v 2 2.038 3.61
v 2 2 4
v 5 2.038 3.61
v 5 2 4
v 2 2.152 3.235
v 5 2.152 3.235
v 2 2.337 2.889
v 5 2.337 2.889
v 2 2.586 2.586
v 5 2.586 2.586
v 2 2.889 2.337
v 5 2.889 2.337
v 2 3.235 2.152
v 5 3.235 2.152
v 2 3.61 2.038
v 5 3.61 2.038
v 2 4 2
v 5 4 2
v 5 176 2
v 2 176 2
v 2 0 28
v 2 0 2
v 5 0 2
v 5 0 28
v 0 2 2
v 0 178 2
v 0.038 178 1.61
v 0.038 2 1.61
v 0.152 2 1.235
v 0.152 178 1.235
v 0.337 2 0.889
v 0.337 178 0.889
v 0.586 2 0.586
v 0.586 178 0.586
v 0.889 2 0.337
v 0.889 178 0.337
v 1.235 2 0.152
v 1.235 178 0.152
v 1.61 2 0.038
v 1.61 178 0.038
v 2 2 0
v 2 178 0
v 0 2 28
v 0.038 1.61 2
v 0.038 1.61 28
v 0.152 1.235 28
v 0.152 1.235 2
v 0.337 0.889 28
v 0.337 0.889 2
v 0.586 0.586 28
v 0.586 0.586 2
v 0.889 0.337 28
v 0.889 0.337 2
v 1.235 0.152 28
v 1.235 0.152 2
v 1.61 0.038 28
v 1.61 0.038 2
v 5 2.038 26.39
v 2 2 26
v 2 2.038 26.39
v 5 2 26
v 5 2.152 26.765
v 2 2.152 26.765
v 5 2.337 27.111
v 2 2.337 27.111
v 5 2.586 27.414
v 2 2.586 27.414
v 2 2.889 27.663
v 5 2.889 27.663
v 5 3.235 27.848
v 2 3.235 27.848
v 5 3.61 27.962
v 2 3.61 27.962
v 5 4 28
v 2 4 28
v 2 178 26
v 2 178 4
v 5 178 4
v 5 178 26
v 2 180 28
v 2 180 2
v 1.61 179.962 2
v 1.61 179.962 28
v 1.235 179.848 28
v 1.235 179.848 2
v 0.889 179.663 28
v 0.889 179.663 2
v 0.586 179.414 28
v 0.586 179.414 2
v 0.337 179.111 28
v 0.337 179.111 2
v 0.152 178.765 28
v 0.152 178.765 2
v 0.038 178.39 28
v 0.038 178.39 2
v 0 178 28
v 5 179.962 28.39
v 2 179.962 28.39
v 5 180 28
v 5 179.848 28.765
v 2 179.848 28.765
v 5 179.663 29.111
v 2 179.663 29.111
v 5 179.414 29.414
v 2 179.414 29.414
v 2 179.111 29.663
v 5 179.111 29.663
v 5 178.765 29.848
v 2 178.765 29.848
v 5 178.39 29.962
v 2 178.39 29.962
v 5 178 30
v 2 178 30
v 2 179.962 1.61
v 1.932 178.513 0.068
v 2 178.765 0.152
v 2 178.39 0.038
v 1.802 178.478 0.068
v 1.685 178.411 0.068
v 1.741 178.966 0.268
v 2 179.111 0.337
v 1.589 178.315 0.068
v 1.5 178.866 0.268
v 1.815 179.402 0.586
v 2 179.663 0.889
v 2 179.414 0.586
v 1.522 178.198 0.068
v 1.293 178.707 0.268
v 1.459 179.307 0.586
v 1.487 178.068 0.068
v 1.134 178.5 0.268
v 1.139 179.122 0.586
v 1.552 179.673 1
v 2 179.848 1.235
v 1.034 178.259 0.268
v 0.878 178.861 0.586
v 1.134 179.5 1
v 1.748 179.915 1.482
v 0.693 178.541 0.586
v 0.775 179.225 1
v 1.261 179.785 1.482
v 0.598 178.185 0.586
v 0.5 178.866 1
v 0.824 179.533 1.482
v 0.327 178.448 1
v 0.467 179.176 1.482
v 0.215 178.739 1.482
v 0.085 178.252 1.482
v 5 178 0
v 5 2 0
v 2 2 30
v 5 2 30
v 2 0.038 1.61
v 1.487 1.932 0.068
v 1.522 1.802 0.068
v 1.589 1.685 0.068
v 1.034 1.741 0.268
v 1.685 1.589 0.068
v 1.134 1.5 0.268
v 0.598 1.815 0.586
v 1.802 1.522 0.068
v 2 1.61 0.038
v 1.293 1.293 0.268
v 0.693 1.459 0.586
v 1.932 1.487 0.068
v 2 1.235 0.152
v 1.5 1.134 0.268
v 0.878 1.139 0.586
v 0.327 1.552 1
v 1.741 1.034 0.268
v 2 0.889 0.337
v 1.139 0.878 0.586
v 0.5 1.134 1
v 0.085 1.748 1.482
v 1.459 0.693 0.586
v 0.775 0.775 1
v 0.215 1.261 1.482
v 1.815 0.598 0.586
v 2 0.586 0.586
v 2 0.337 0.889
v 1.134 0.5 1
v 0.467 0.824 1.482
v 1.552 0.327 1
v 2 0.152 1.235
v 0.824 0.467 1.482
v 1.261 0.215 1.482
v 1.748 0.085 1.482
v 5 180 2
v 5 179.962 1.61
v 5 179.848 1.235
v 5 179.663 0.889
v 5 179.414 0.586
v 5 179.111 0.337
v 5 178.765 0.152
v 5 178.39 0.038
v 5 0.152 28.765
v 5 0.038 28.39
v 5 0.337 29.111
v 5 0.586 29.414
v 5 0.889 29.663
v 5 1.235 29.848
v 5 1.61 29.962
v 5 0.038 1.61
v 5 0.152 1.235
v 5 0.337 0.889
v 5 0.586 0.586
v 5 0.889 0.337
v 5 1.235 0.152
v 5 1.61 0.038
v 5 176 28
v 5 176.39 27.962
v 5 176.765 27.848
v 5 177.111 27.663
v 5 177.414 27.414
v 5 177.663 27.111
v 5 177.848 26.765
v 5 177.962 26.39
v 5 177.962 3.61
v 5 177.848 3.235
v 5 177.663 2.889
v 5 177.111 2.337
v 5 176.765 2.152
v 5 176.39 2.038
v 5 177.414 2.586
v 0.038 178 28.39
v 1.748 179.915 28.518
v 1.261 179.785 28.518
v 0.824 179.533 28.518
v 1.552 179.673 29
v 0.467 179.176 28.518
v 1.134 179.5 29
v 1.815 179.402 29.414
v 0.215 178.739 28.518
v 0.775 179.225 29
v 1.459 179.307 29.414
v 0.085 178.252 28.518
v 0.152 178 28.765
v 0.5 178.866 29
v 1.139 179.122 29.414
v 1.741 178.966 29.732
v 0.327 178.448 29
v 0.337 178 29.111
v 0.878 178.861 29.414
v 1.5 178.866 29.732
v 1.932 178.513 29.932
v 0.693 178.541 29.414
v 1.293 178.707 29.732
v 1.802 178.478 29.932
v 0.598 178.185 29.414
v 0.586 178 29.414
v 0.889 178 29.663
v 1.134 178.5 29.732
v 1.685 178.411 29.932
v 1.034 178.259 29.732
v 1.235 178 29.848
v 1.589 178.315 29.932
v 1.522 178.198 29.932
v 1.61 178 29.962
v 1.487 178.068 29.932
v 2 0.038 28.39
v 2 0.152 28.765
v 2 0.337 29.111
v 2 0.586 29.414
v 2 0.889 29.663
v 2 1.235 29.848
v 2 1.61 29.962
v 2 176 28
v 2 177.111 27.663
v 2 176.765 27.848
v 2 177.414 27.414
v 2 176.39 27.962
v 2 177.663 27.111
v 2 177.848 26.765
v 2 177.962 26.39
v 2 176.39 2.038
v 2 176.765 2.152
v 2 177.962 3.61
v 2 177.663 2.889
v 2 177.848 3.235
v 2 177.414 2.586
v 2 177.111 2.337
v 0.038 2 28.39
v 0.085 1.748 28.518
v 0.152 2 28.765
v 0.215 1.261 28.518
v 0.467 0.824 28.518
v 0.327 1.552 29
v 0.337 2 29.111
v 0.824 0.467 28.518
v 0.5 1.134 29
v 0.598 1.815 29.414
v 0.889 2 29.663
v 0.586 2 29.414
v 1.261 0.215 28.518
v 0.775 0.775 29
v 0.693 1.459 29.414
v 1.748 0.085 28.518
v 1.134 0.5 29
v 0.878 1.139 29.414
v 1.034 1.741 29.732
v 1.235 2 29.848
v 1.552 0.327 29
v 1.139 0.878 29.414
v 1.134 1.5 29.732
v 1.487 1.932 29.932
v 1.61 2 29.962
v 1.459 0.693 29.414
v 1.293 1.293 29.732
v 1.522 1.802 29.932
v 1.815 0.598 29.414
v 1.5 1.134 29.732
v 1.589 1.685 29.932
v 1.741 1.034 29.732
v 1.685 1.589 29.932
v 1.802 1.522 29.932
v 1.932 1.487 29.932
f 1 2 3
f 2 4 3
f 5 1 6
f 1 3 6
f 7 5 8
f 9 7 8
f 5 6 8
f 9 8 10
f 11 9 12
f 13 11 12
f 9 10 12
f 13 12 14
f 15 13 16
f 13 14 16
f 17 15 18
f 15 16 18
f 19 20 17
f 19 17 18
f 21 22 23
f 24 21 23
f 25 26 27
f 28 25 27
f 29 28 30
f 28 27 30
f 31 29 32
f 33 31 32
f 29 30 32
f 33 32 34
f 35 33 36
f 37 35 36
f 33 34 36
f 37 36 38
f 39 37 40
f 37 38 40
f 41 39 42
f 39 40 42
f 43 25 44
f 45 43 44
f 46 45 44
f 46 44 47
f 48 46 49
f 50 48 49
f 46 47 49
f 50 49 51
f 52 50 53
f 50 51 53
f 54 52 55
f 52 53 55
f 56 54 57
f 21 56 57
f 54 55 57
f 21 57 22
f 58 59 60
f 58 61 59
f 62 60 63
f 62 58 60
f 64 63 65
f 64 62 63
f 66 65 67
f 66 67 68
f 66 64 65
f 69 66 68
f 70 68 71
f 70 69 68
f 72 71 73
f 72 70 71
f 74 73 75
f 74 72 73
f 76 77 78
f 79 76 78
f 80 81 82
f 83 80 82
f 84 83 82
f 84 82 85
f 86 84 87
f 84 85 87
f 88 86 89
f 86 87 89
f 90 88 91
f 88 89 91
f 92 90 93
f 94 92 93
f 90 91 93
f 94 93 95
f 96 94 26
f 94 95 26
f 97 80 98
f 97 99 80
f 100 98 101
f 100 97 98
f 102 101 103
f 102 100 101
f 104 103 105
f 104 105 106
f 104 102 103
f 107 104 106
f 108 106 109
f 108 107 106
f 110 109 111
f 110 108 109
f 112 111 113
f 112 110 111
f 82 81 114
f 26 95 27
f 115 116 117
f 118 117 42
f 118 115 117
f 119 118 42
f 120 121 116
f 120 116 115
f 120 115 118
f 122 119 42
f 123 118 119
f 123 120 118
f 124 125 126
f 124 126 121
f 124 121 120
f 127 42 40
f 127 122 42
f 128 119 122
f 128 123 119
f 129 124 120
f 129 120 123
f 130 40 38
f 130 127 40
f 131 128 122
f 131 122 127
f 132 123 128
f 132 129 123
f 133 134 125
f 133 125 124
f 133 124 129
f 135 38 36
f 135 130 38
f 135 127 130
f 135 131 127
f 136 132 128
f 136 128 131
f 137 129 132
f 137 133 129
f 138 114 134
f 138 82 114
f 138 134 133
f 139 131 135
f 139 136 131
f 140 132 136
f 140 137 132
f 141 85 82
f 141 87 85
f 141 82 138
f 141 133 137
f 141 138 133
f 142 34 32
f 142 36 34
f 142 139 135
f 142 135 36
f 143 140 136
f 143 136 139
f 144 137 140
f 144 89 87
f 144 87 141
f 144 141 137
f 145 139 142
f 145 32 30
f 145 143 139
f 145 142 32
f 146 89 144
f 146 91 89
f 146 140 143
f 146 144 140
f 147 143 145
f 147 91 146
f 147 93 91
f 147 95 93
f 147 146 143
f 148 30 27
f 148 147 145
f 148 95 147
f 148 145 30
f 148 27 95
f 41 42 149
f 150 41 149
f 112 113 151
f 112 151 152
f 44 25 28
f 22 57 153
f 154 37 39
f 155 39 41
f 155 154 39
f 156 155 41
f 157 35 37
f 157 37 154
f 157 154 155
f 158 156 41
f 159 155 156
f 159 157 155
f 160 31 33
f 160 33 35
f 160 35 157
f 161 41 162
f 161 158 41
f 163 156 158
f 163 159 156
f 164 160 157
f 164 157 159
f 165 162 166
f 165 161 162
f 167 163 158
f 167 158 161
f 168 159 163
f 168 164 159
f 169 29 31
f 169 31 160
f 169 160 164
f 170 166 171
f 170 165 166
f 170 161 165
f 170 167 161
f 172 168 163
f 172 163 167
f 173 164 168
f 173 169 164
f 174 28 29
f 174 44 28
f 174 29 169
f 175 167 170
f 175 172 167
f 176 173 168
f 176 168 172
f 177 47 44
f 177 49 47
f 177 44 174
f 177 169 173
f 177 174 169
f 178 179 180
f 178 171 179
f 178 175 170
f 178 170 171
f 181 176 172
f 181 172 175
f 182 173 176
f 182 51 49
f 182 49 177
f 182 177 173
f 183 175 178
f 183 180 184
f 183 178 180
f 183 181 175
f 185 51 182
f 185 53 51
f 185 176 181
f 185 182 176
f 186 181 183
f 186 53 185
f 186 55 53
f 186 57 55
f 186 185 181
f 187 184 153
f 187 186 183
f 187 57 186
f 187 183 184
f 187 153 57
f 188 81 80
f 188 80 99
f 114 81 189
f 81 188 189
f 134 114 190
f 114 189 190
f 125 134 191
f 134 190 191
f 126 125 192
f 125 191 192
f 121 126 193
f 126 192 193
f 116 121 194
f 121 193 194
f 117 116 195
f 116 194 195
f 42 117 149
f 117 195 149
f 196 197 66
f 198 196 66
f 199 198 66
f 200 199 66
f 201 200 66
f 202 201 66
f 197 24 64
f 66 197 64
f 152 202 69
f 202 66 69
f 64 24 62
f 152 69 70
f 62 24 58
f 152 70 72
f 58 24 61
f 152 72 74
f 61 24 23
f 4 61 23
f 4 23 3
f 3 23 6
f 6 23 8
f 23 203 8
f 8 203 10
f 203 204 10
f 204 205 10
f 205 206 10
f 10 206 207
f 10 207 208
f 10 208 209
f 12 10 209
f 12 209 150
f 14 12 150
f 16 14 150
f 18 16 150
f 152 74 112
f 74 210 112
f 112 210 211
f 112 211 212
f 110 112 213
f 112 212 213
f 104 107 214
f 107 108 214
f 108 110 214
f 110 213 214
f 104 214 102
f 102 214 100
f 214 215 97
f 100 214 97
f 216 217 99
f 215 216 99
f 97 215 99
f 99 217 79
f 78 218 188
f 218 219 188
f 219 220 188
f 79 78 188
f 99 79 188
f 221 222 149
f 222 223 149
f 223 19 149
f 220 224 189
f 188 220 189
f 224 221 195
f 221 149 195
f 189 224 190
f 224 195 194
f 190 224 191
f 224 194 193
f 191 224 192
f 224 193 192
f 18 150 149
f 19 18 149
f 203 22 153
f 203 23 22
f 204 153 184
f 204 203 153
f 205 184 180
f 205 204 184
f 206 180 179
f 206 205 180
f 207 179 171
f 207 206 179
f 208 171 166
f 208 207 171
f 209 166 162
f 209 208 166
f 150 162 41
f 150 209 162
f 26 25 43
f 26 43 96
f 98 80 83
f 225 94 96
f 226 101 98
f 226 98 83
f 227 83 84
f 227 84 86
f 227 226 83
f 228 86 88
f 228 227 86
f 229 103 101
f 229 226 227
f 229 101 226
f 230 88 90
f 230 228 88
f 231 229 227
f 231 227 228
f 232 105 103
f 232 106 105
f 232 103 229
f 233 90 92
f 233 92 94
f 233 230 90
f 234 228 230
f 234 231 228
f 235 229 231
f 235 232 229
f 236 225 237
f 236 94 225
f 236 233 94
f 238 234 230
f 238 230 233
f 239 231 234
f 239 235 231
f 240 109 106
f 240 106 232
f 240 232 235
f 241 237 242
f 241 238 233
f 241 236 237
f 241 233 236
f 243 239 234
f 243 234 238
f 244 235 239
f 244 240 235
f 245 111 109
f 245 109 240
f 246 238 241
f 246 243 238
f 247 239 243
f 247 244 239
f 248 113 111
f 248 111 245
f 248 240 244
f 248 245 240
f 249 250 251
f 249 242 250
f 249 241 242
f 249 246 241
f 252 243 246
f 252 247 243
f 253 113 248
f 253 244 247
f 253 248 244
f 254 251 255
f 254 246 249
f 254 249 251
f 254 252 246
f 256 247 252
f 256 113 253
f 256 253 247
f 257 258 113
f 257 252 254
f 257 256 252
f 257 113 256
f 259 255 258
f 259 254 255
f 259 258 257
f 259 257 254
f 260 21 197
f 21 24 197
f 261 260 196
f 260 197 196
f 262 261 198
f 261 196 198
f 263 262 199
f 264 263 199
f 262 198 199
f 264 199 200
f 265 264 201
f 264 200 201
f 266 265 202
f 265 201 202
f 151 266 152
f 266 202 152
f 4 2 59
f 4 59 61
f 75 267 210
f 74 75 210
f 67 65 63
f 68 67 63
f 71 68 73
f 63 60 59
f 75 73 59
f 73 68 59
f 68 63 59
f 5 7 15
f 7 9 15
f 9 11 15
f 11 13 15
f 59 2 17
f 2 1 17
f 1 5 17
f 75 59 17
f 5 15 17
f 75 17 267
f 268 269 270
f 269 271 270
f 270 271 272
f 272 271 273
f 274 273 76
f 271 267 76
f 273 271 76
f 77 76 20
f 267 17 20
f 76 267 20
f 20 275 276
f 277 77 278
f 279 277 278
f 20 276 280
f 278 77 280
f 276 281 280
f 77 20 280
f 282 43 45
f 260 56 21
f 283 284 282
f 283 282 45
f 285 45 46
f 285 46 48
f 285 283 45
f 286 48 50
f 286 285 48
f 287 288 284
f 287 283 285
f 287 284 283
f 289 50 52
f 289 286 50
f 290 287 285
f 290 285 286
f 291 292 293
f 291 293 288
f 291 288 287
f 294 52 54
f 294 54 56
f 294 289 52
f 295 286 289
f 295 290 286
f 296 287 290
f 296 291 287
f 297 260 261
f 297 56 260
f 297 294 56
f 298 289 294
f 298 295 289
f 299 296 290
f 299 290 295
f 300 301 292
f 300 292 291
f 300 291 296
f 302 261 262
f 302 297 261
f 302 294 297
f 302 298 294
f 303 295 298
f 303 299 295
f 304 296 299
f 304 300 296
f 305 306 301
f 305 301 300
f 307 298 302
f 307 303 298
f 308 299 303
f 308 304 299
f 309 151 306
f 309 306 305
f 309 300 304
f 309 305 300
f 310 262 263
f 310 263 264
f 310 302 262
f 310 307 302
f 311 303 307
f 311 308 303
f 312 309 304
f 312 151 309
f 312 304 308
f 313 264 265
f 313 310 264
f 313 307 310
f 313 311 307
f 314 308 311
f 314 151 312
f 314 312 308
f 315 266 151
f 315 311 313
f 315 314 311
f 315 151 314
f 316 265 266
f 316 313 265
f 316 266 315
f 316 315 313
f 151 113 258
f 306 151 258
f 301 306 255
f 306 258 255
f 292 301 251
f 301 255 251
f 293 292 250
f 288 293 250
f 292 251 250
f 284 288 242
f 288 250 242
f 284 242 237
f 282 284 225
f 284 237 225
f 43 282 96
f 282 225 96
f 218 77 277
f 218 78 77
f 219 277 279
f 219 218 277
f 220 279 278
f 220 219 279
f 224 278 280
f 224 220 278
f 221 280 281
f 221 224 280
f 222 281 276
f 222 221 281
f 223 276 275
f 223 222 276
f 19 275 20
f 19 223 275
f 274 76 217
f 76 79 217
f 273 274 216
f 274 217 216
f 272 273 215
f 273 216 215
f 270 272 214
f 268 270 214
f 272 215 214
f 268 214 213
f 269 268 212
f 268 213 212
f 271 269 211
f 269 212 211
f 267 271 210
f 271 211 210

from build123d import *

# Parameters (mm, degrees)
BOX007_W          = 3
BOX007_H          = 176
BOX007_DEPTH      = 26
FILLET003_R       = 2
BOX005_W          = 2
BOX005_H          = 176
BOX005_DEPTH      = 26
CYLINDER021_R     = 2
CYLINDER021_DEPTH = 26
CYLINDER022_R     = 2
CYLINDER022_DEPTH = 26
CYLINDER023_R     = 2
CYLINDER023_DEPTH = 176
CYLINDER024_R     = 2
CYLINDER024_DEPTH = 176
BOX006_W          = 3
BOX006_H          = 180
BOX006_DEPTH      = 30
FILLET002_R       = 2


with BuildPart() as fillet003:
    # Box007 → Box007 (new body)
    with BuildSketch(Plane(origin=(7, 2, 2), x_dir=(1, 0, 0), z_dir=(0, 0, 1))):
        with Locations((1.5, 88)):
            Rectangle(BOX007_W, BOX007_H)
    extrude(amount=BOX007_DEPTH)

    # Fillet003
    fillet003_edges = [fillet003.edges().sort_by_distance(p)[0] for p in [
        (8.5, 2, 2),
        (8.5, 2, 28),
        (8.5, 178, 2),
        (8.5, 178, 28),
    ]]
    fillet(fillet003_edges, radius=FILLET003_R)


with BuildPart() as fillet003_1:
    # Fillet003 placement: moved
    add(fillet003.part.moved(Location((-5, 0, 0))))


with BuildPart() as cube005:
    # Box005 → Box005 (new body)
    with BuildSketch(Plane(origin=(0, 2, 2), x_dir=(1, 0, 0), z_dir=(0, 0, 1))):
        with Locations((1, 88)):
            Rectangle(BOX005_W, BOX005_H)
    extrude(amount=BOX005_DEPTH)


with BuildPart() as cylinder021:
    # Cylinder021 → Cylinder021 (new body)
    with BuildSketch(Plane(origin=(2, 2, 2), x_dir=(0, 1, 0), z_dir=(0, 0, 1))):
        Circle(CYLINDER021_R)
    extrude(amount=CYLINDER021_DEPTH)


with BuildPart() as cylinder022:
    # Cylinder022 → Cylinder022 (new body)
    with BuildSketch(Plane(origin=(2, 178, 2), x_dir=(0, 1, 0), z_dir=(0, 0, 1))):
        Circle(CYLINDER022_R)
    extrude(amount=CYLINDER022_DEPTH)


with BuildPart() as cylinder023:
    # Cylinder023 → Cylinder023 (new body)
    with BuildSketch(Plane(origin=(2, 178, 2), x_dir=(1, 0, 0), z_dir=(0, -1, 0))):
        Circle(CYLINDER023_R)
    extrude(amount=CYLINDER023_DEPTH)


with BuildPart() as cylinder024:
    # Cylinder024 → Cylinder024 (new body)
    with BuildSketch(Plane(origin=(2, 178, 28), x_dir=(1, 0, 0), z_dir=(0, -1, 0))):
        Circle(CYLINDER024_R)
    extrude(amount=CYLINDER024_DEPTH)


with BuildPart() as sphere005:
    # Sphere004 → Sphere004 (revolve)
    with BuildSketch(Plane(origin=(2, 2, 2), x_dir=(1, 0, 0), z_dir=(0, -1, 0))):
        with BuildLine():
            ThreePointArc((0, -2), (2, 0), (0, 2))
            Line((0, 2), (0, -2))
        make_face()
    revolve(axis=Axis((2, 2, 2), (0, 0, 1)))


with BuildPart() as sphere006:
    # Sphere005 → Sphere005 (revolve)
    with BuildSketch(Plane(origin=(2, 178, 2), x_dir=(1, 0, 0), z_dir=(0, -1, 0))):
        with BuildLine():
            ThreePointArc((0, -2), (2, 0), (0, 2))
            Line((0, 2), (0, -2))
        make_face()
    revolve(axis=Axis((2, 178, 2), (0, 0, 1)))


with BuildPart() as sphere007:
    # Sphere006 → Sphere006 (revolve)
    with BuildSketch(Plane(origin=(2, 2, 28), x_dir=(1, 0, 0), z_dir=(0, -1, 0))):
        with BuildLine():
            ThreePointArc((0, -2), (2, 0), (0, 2))
            Line((0, 2), (0, -2))
        make_face()
    revolve(axis=Axis((2, 2, 28), (0, 0, 1)))


with BuildPart() as sphere008:
    # Sphere007 → Sphere007 (revolve)
    with BuildSketch(Plane(origin=(2, 178, 28), x_dir=(1, 0, 0), z_dir=(0, -1, 0))):
        with BuildLine():
            ThreePointArc((0, -2), (2, 0), (0, 2))
            Line((0, 2), (0, -2))
        make_face()
    revolve(axis=Axis((2, 178, 28), (0, 0, 1)))


with BuildPart() as cut027:
    # Box006 → Box006 (new body)
    with BuildSketch(Plane(origin=(2, 0, 0), x_dir=(1, 0, 0), z_dir=(0, 0, 1))):
        with Locations((1.5, 90)):
            Rectangle(BOX006_W, BOX006_H)
    extrude(amount=BOX006_DEPTH)

    # Fillet002
    fillet002_edges = [cut027.edges().sort_by_distance(p)[0] for p in [
        (3.5, 0, 0),
        (3.5, 0, 30),
        (3.5, 180, 0),
        (3.5, 180, 30),
    ]]
    fillet(fillet002_edges, radius=FILLET002_R)

    # Fusion001: union Cube005, Cylinder021, Cylinder022, Cylinder023, Cylinder024, Sphere005, Sphere006, Sphere007, Sphere008
    add(cube005.part)
    add(cylinder021.part)
    add(cylinder022.part)
    add(cylinder023.part)
    add(cylinder024.part)
    add(sphere005.part)
    add(sphere006.part)
    add(sphere007.part)
    add(sphere008.part)

    # Cut027: cut Fillet003
    add(fillet003_1.part, mode=Mode.SUBTRACT)


solid = cut027.part
